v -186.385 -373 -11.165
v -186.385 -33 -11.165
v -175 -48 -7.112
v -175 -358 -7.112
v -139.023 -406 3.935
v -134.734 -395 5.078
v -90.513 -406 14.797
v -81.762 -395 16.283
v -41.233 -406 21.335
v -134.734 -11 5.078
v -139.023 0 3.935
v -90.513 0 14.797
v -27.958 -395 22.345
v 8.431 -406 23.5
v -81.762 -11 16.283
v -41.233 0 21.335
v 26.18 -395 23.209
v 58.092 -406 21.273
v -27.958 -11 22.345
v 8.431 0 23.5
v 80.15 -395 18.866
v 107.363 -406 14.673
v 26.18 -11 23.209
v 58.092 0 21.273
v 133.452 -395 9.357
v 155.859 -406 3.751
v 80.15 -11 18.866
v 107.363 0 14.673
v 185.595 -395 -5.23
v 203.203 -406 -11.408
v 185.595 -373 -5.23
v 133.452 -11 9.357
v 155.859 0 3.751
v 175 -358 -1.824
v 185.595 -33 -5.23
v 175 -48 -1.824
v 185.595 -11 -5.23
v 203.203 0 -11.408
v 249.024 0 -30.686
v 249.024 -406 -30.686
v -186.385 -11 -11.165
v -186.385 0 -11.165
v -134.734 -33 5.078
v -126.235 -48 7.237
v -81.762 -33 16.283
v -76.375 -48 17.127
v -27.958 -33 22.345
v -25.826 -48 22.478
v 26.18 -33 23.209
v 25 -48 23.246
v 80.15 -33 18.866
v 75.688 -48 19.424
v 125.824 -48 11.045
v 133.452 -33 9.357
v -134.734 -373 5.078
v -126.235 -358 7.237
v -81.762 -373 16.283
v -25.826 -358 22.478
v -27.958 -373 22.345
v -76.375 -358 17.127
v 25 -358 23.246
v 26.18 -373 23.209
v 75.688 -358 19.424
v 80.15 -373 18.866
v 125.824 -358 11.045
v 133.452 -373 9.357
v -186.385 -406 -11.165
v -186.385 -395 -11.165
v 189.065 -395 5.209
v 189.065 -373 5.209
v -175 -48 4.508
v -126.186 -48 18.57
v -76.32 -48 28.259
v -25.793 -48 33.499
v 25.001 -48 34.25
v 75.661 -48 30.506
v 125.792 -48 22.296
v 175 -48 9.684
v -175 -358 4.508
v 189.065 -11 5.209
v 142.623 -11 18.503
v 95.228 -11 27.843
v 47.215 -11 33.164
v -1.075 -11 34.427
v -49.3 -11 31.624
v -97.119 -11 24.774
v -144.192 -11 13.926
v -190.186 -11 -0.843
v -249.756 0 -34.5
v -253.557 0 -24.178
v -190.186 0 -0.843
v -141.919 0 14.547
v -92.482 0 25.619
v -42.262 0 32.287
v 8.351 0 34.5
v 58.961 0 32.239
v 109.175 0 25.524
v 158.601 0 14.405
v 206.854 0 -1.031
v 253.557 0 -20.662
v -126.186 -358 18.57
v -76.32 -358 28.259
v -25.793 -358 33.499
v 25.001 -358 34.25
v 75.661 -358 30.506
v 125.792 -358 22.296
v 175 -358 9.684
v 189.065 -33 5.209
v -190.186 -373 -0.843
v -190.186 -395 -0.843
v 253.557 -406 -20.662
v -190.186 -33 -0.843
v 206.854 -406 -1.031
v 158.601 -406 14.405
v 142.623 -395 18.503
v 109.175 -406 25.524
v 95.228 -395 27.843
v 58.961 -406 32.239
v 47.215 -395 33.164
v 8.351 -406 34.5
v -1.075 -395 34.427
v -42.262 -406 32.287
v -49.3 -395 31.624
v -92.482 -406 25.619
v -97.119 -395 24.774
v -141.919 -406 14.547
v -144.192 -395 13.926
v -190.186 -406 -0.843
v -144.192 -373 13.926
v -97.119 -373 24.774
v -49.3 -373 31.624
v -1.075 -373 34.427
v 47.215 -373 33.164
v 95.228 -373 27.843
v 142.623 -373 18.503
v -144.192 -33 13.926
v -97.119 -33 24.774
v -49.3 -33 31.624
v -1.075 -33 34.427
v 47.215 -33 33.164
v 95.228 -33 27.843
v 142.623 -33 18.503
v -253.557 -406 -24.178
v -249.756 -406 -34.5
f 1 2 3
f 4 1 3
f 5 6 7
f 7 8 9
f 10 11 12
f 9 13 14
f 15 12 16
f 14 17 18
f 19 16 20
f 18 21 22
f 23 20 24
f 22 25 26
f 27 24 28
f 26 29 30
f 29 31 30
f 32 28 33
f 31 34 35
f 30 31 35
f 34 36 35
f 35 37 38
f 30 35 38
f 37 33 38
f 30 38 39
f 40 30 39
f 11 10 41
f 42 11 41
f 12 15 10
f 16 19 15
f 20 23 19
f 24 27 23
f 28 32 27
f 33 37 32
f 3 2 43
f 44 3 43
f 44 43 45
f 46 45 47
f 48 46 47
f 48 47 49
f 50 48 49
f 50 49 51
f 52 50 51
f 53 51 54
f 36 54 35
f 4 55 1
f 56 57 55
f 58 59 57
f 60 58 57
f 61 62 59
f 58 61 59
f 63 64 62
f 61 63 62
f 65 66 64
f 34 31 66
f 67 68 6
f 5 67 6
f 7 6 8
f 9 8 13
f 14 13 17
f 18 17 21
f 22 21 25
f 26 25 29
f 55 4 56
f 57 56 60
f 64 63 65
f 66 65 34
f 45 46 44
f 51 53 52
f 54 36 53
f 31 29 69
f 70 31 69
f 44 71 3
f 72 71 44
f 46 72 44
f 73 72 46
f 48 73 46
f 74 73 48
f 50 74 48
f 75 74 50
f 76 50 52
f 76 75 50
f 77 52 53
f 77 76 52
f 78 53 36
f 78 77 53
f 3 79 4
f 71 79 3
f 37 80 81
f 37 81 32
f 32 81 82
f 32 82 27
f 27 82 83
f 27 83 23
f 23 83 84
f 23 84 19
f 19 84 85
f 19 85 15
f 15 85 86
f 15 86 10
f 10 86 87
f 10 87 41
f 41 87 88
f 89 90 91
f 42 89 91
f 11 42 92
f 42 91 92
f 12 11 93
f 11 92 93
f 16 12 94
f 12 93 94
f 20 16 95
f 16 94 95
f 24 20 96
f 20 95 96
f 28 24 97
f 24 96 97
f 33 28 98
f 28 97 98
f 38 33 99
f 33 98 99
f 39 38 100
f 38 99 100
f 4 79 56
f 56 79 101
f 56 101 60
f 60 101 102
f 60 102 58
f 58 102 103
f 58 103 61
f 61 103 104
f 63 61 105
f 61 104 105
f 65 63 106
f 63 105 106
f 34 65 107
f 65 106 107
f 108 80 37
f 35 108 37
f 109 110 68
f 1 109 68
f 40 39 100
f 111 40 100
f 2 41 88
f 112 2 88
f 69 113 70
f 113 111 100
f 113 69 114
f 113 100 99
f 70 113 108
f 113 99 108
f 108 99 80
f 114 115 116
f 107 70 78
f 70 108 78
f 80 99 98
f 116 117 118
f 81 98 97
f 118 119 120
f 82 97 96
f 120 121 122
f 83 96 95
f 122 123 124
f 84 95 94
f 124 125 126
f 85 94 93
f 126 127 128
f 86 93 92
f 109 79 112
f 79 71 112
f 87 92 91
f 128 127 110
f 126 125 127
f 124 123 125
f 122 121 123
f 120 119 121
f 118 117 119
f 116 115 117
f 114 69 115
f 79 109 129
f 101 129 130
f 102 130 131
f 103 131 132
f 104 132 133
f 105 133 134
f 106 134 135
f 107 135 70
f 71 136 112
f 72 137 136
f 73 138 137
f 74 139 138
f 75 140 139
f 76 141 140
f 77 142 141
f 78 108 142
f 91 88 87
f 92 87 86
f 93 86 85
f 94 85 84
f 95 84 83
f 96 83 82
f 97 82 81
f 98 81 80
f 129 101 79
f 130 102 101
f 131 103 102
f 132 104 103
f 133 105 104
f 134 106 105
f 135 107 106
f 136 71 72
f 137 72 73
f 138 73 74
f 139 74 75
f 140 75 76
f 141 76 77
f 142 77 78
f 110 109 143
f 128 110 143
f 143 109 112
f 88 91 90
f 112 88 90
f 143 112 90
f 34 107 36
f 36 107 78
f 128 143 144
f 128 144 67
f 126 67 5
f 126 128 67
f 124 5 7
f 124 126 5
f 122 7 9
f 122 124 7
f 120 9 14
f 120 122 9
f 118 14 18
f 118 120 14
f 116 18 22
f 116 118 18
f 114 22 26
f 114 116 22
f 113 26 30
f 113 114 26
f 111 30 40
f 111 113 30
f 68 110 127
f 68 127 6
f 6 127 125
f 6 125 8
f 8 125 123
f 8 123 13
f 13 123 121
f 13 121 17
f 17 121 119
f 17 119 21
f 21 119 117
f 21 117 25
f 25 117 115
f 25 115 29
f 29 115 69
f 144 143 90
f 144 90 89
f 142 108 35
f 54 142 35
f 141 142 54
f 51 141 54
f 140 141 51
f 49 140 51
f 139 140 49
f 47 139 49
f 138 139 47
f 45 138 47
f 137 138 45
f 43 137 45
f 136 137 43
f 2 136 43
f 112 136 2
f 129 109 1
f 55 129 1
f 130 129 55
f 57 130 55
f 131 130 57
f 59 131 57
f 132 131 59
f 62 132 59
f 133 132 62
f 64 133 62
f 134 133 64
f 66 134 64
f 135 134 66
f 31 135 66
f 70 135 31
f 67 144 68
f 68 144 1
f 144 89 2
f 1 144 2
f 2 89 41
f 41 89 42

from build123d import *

# Parameters (mm, degrees)
F1_DEPTH  = 406
F4_DEPTH  = 22
F7_DEPTH  = 22
F9_W      = 350
F9_H      = 310
F10_DEPTH = 200


# Not quite as in the source:
# - ends of sketch curves that miss each other by under 0.0002 mm in the source are joined


with BuildPart() as f1:
    # F0 (on Front) → F1 (new body)
    with BuildSketch(Plane.XZ):
        with BuildLine():
            ThreePointArc((-186.3848490661, -11.1654008205), (33.2859089962, 22.935224068), (249.0237497892, -30.686400445))
            Line((249.0237497892, -30.686400445), (253.556713, -20.661948))
            ThreePointArc((253.556713, -20.661948), (33.6810541326, 33.9285497238), (-190.1858030941, -0.8429617445))
            Line((-190.1858030941, -0.8429617445), (-253.556714, -24.177561))
            Line((-253.556714, -24.177561), (-249.755724, -34.499987))
            Line((-249.755724, -34.499987), (-186.3848490661, -11.1654008205))
        make_face()
    extrude(amount=F1_DEPTH)

    # F3 (on offset) → F4 (cut)
    with BuildSketch(Plane.XZ.offset(395)):
        with BuildLine():
            Line((184.0178133859, -9.9744413883), (190.6417317828, 9.9535215049))
            ThreePointArc((190.6417317828, 9.9535215049), (-1.1548935515, 39.4263138769), (-191.9135098522, 3.8490558767))
            Line((-191.9135098522, 3.8490558767), (-184.6571423005, -15.8574184389))
            ThreePointArc((-184.6571423005, -15.8574184389), (-0.819837913, 18.4289869585), (184.0178133859, -9.9744413883))
        make_face()
    extrude(amount=-F4_DEPTH, mode=Mode.SUBTRACT)

    # F6 (on offset) → F7 (cut)
    with BuildSketch(Plane(origin=(0, -11, 0), x_dir=(-1, 0, 0), z_dir=(0, 1, 0))):
        with BuildLine():
            ThreePointArc((191.9135098522, 3.8490558767), (1.1548935515, 39.4263138769), (-190.6417317828, 9.9535215049))
            Line((-190.6417317828, 9.9535215049), (-184.0178133859, -9.9744413883))
            ThreePointArc((-184.0178133859, -9.9744413883), (0.819837913, 18.4289869585), (184.6571423005, -15.8574184389))
            Line((184.6571423005, -15.8574184389), (191.9135098522, 3.8490558767))
        make_face()
    extrude(amount=-F7_DEPTH, mode=Mode.SUBTRACT)

    # F9 (on offset) → F10 (cut)
    with BuildSketch(Plane.XY.offset(134)):
        with Locations((-5e-07, -203)):
            Rectangle(F9_W, F9_H)
    extrude(amount=-F10_DEPTH, mode=Mode.SUBTRACT)


solid = f1.part
